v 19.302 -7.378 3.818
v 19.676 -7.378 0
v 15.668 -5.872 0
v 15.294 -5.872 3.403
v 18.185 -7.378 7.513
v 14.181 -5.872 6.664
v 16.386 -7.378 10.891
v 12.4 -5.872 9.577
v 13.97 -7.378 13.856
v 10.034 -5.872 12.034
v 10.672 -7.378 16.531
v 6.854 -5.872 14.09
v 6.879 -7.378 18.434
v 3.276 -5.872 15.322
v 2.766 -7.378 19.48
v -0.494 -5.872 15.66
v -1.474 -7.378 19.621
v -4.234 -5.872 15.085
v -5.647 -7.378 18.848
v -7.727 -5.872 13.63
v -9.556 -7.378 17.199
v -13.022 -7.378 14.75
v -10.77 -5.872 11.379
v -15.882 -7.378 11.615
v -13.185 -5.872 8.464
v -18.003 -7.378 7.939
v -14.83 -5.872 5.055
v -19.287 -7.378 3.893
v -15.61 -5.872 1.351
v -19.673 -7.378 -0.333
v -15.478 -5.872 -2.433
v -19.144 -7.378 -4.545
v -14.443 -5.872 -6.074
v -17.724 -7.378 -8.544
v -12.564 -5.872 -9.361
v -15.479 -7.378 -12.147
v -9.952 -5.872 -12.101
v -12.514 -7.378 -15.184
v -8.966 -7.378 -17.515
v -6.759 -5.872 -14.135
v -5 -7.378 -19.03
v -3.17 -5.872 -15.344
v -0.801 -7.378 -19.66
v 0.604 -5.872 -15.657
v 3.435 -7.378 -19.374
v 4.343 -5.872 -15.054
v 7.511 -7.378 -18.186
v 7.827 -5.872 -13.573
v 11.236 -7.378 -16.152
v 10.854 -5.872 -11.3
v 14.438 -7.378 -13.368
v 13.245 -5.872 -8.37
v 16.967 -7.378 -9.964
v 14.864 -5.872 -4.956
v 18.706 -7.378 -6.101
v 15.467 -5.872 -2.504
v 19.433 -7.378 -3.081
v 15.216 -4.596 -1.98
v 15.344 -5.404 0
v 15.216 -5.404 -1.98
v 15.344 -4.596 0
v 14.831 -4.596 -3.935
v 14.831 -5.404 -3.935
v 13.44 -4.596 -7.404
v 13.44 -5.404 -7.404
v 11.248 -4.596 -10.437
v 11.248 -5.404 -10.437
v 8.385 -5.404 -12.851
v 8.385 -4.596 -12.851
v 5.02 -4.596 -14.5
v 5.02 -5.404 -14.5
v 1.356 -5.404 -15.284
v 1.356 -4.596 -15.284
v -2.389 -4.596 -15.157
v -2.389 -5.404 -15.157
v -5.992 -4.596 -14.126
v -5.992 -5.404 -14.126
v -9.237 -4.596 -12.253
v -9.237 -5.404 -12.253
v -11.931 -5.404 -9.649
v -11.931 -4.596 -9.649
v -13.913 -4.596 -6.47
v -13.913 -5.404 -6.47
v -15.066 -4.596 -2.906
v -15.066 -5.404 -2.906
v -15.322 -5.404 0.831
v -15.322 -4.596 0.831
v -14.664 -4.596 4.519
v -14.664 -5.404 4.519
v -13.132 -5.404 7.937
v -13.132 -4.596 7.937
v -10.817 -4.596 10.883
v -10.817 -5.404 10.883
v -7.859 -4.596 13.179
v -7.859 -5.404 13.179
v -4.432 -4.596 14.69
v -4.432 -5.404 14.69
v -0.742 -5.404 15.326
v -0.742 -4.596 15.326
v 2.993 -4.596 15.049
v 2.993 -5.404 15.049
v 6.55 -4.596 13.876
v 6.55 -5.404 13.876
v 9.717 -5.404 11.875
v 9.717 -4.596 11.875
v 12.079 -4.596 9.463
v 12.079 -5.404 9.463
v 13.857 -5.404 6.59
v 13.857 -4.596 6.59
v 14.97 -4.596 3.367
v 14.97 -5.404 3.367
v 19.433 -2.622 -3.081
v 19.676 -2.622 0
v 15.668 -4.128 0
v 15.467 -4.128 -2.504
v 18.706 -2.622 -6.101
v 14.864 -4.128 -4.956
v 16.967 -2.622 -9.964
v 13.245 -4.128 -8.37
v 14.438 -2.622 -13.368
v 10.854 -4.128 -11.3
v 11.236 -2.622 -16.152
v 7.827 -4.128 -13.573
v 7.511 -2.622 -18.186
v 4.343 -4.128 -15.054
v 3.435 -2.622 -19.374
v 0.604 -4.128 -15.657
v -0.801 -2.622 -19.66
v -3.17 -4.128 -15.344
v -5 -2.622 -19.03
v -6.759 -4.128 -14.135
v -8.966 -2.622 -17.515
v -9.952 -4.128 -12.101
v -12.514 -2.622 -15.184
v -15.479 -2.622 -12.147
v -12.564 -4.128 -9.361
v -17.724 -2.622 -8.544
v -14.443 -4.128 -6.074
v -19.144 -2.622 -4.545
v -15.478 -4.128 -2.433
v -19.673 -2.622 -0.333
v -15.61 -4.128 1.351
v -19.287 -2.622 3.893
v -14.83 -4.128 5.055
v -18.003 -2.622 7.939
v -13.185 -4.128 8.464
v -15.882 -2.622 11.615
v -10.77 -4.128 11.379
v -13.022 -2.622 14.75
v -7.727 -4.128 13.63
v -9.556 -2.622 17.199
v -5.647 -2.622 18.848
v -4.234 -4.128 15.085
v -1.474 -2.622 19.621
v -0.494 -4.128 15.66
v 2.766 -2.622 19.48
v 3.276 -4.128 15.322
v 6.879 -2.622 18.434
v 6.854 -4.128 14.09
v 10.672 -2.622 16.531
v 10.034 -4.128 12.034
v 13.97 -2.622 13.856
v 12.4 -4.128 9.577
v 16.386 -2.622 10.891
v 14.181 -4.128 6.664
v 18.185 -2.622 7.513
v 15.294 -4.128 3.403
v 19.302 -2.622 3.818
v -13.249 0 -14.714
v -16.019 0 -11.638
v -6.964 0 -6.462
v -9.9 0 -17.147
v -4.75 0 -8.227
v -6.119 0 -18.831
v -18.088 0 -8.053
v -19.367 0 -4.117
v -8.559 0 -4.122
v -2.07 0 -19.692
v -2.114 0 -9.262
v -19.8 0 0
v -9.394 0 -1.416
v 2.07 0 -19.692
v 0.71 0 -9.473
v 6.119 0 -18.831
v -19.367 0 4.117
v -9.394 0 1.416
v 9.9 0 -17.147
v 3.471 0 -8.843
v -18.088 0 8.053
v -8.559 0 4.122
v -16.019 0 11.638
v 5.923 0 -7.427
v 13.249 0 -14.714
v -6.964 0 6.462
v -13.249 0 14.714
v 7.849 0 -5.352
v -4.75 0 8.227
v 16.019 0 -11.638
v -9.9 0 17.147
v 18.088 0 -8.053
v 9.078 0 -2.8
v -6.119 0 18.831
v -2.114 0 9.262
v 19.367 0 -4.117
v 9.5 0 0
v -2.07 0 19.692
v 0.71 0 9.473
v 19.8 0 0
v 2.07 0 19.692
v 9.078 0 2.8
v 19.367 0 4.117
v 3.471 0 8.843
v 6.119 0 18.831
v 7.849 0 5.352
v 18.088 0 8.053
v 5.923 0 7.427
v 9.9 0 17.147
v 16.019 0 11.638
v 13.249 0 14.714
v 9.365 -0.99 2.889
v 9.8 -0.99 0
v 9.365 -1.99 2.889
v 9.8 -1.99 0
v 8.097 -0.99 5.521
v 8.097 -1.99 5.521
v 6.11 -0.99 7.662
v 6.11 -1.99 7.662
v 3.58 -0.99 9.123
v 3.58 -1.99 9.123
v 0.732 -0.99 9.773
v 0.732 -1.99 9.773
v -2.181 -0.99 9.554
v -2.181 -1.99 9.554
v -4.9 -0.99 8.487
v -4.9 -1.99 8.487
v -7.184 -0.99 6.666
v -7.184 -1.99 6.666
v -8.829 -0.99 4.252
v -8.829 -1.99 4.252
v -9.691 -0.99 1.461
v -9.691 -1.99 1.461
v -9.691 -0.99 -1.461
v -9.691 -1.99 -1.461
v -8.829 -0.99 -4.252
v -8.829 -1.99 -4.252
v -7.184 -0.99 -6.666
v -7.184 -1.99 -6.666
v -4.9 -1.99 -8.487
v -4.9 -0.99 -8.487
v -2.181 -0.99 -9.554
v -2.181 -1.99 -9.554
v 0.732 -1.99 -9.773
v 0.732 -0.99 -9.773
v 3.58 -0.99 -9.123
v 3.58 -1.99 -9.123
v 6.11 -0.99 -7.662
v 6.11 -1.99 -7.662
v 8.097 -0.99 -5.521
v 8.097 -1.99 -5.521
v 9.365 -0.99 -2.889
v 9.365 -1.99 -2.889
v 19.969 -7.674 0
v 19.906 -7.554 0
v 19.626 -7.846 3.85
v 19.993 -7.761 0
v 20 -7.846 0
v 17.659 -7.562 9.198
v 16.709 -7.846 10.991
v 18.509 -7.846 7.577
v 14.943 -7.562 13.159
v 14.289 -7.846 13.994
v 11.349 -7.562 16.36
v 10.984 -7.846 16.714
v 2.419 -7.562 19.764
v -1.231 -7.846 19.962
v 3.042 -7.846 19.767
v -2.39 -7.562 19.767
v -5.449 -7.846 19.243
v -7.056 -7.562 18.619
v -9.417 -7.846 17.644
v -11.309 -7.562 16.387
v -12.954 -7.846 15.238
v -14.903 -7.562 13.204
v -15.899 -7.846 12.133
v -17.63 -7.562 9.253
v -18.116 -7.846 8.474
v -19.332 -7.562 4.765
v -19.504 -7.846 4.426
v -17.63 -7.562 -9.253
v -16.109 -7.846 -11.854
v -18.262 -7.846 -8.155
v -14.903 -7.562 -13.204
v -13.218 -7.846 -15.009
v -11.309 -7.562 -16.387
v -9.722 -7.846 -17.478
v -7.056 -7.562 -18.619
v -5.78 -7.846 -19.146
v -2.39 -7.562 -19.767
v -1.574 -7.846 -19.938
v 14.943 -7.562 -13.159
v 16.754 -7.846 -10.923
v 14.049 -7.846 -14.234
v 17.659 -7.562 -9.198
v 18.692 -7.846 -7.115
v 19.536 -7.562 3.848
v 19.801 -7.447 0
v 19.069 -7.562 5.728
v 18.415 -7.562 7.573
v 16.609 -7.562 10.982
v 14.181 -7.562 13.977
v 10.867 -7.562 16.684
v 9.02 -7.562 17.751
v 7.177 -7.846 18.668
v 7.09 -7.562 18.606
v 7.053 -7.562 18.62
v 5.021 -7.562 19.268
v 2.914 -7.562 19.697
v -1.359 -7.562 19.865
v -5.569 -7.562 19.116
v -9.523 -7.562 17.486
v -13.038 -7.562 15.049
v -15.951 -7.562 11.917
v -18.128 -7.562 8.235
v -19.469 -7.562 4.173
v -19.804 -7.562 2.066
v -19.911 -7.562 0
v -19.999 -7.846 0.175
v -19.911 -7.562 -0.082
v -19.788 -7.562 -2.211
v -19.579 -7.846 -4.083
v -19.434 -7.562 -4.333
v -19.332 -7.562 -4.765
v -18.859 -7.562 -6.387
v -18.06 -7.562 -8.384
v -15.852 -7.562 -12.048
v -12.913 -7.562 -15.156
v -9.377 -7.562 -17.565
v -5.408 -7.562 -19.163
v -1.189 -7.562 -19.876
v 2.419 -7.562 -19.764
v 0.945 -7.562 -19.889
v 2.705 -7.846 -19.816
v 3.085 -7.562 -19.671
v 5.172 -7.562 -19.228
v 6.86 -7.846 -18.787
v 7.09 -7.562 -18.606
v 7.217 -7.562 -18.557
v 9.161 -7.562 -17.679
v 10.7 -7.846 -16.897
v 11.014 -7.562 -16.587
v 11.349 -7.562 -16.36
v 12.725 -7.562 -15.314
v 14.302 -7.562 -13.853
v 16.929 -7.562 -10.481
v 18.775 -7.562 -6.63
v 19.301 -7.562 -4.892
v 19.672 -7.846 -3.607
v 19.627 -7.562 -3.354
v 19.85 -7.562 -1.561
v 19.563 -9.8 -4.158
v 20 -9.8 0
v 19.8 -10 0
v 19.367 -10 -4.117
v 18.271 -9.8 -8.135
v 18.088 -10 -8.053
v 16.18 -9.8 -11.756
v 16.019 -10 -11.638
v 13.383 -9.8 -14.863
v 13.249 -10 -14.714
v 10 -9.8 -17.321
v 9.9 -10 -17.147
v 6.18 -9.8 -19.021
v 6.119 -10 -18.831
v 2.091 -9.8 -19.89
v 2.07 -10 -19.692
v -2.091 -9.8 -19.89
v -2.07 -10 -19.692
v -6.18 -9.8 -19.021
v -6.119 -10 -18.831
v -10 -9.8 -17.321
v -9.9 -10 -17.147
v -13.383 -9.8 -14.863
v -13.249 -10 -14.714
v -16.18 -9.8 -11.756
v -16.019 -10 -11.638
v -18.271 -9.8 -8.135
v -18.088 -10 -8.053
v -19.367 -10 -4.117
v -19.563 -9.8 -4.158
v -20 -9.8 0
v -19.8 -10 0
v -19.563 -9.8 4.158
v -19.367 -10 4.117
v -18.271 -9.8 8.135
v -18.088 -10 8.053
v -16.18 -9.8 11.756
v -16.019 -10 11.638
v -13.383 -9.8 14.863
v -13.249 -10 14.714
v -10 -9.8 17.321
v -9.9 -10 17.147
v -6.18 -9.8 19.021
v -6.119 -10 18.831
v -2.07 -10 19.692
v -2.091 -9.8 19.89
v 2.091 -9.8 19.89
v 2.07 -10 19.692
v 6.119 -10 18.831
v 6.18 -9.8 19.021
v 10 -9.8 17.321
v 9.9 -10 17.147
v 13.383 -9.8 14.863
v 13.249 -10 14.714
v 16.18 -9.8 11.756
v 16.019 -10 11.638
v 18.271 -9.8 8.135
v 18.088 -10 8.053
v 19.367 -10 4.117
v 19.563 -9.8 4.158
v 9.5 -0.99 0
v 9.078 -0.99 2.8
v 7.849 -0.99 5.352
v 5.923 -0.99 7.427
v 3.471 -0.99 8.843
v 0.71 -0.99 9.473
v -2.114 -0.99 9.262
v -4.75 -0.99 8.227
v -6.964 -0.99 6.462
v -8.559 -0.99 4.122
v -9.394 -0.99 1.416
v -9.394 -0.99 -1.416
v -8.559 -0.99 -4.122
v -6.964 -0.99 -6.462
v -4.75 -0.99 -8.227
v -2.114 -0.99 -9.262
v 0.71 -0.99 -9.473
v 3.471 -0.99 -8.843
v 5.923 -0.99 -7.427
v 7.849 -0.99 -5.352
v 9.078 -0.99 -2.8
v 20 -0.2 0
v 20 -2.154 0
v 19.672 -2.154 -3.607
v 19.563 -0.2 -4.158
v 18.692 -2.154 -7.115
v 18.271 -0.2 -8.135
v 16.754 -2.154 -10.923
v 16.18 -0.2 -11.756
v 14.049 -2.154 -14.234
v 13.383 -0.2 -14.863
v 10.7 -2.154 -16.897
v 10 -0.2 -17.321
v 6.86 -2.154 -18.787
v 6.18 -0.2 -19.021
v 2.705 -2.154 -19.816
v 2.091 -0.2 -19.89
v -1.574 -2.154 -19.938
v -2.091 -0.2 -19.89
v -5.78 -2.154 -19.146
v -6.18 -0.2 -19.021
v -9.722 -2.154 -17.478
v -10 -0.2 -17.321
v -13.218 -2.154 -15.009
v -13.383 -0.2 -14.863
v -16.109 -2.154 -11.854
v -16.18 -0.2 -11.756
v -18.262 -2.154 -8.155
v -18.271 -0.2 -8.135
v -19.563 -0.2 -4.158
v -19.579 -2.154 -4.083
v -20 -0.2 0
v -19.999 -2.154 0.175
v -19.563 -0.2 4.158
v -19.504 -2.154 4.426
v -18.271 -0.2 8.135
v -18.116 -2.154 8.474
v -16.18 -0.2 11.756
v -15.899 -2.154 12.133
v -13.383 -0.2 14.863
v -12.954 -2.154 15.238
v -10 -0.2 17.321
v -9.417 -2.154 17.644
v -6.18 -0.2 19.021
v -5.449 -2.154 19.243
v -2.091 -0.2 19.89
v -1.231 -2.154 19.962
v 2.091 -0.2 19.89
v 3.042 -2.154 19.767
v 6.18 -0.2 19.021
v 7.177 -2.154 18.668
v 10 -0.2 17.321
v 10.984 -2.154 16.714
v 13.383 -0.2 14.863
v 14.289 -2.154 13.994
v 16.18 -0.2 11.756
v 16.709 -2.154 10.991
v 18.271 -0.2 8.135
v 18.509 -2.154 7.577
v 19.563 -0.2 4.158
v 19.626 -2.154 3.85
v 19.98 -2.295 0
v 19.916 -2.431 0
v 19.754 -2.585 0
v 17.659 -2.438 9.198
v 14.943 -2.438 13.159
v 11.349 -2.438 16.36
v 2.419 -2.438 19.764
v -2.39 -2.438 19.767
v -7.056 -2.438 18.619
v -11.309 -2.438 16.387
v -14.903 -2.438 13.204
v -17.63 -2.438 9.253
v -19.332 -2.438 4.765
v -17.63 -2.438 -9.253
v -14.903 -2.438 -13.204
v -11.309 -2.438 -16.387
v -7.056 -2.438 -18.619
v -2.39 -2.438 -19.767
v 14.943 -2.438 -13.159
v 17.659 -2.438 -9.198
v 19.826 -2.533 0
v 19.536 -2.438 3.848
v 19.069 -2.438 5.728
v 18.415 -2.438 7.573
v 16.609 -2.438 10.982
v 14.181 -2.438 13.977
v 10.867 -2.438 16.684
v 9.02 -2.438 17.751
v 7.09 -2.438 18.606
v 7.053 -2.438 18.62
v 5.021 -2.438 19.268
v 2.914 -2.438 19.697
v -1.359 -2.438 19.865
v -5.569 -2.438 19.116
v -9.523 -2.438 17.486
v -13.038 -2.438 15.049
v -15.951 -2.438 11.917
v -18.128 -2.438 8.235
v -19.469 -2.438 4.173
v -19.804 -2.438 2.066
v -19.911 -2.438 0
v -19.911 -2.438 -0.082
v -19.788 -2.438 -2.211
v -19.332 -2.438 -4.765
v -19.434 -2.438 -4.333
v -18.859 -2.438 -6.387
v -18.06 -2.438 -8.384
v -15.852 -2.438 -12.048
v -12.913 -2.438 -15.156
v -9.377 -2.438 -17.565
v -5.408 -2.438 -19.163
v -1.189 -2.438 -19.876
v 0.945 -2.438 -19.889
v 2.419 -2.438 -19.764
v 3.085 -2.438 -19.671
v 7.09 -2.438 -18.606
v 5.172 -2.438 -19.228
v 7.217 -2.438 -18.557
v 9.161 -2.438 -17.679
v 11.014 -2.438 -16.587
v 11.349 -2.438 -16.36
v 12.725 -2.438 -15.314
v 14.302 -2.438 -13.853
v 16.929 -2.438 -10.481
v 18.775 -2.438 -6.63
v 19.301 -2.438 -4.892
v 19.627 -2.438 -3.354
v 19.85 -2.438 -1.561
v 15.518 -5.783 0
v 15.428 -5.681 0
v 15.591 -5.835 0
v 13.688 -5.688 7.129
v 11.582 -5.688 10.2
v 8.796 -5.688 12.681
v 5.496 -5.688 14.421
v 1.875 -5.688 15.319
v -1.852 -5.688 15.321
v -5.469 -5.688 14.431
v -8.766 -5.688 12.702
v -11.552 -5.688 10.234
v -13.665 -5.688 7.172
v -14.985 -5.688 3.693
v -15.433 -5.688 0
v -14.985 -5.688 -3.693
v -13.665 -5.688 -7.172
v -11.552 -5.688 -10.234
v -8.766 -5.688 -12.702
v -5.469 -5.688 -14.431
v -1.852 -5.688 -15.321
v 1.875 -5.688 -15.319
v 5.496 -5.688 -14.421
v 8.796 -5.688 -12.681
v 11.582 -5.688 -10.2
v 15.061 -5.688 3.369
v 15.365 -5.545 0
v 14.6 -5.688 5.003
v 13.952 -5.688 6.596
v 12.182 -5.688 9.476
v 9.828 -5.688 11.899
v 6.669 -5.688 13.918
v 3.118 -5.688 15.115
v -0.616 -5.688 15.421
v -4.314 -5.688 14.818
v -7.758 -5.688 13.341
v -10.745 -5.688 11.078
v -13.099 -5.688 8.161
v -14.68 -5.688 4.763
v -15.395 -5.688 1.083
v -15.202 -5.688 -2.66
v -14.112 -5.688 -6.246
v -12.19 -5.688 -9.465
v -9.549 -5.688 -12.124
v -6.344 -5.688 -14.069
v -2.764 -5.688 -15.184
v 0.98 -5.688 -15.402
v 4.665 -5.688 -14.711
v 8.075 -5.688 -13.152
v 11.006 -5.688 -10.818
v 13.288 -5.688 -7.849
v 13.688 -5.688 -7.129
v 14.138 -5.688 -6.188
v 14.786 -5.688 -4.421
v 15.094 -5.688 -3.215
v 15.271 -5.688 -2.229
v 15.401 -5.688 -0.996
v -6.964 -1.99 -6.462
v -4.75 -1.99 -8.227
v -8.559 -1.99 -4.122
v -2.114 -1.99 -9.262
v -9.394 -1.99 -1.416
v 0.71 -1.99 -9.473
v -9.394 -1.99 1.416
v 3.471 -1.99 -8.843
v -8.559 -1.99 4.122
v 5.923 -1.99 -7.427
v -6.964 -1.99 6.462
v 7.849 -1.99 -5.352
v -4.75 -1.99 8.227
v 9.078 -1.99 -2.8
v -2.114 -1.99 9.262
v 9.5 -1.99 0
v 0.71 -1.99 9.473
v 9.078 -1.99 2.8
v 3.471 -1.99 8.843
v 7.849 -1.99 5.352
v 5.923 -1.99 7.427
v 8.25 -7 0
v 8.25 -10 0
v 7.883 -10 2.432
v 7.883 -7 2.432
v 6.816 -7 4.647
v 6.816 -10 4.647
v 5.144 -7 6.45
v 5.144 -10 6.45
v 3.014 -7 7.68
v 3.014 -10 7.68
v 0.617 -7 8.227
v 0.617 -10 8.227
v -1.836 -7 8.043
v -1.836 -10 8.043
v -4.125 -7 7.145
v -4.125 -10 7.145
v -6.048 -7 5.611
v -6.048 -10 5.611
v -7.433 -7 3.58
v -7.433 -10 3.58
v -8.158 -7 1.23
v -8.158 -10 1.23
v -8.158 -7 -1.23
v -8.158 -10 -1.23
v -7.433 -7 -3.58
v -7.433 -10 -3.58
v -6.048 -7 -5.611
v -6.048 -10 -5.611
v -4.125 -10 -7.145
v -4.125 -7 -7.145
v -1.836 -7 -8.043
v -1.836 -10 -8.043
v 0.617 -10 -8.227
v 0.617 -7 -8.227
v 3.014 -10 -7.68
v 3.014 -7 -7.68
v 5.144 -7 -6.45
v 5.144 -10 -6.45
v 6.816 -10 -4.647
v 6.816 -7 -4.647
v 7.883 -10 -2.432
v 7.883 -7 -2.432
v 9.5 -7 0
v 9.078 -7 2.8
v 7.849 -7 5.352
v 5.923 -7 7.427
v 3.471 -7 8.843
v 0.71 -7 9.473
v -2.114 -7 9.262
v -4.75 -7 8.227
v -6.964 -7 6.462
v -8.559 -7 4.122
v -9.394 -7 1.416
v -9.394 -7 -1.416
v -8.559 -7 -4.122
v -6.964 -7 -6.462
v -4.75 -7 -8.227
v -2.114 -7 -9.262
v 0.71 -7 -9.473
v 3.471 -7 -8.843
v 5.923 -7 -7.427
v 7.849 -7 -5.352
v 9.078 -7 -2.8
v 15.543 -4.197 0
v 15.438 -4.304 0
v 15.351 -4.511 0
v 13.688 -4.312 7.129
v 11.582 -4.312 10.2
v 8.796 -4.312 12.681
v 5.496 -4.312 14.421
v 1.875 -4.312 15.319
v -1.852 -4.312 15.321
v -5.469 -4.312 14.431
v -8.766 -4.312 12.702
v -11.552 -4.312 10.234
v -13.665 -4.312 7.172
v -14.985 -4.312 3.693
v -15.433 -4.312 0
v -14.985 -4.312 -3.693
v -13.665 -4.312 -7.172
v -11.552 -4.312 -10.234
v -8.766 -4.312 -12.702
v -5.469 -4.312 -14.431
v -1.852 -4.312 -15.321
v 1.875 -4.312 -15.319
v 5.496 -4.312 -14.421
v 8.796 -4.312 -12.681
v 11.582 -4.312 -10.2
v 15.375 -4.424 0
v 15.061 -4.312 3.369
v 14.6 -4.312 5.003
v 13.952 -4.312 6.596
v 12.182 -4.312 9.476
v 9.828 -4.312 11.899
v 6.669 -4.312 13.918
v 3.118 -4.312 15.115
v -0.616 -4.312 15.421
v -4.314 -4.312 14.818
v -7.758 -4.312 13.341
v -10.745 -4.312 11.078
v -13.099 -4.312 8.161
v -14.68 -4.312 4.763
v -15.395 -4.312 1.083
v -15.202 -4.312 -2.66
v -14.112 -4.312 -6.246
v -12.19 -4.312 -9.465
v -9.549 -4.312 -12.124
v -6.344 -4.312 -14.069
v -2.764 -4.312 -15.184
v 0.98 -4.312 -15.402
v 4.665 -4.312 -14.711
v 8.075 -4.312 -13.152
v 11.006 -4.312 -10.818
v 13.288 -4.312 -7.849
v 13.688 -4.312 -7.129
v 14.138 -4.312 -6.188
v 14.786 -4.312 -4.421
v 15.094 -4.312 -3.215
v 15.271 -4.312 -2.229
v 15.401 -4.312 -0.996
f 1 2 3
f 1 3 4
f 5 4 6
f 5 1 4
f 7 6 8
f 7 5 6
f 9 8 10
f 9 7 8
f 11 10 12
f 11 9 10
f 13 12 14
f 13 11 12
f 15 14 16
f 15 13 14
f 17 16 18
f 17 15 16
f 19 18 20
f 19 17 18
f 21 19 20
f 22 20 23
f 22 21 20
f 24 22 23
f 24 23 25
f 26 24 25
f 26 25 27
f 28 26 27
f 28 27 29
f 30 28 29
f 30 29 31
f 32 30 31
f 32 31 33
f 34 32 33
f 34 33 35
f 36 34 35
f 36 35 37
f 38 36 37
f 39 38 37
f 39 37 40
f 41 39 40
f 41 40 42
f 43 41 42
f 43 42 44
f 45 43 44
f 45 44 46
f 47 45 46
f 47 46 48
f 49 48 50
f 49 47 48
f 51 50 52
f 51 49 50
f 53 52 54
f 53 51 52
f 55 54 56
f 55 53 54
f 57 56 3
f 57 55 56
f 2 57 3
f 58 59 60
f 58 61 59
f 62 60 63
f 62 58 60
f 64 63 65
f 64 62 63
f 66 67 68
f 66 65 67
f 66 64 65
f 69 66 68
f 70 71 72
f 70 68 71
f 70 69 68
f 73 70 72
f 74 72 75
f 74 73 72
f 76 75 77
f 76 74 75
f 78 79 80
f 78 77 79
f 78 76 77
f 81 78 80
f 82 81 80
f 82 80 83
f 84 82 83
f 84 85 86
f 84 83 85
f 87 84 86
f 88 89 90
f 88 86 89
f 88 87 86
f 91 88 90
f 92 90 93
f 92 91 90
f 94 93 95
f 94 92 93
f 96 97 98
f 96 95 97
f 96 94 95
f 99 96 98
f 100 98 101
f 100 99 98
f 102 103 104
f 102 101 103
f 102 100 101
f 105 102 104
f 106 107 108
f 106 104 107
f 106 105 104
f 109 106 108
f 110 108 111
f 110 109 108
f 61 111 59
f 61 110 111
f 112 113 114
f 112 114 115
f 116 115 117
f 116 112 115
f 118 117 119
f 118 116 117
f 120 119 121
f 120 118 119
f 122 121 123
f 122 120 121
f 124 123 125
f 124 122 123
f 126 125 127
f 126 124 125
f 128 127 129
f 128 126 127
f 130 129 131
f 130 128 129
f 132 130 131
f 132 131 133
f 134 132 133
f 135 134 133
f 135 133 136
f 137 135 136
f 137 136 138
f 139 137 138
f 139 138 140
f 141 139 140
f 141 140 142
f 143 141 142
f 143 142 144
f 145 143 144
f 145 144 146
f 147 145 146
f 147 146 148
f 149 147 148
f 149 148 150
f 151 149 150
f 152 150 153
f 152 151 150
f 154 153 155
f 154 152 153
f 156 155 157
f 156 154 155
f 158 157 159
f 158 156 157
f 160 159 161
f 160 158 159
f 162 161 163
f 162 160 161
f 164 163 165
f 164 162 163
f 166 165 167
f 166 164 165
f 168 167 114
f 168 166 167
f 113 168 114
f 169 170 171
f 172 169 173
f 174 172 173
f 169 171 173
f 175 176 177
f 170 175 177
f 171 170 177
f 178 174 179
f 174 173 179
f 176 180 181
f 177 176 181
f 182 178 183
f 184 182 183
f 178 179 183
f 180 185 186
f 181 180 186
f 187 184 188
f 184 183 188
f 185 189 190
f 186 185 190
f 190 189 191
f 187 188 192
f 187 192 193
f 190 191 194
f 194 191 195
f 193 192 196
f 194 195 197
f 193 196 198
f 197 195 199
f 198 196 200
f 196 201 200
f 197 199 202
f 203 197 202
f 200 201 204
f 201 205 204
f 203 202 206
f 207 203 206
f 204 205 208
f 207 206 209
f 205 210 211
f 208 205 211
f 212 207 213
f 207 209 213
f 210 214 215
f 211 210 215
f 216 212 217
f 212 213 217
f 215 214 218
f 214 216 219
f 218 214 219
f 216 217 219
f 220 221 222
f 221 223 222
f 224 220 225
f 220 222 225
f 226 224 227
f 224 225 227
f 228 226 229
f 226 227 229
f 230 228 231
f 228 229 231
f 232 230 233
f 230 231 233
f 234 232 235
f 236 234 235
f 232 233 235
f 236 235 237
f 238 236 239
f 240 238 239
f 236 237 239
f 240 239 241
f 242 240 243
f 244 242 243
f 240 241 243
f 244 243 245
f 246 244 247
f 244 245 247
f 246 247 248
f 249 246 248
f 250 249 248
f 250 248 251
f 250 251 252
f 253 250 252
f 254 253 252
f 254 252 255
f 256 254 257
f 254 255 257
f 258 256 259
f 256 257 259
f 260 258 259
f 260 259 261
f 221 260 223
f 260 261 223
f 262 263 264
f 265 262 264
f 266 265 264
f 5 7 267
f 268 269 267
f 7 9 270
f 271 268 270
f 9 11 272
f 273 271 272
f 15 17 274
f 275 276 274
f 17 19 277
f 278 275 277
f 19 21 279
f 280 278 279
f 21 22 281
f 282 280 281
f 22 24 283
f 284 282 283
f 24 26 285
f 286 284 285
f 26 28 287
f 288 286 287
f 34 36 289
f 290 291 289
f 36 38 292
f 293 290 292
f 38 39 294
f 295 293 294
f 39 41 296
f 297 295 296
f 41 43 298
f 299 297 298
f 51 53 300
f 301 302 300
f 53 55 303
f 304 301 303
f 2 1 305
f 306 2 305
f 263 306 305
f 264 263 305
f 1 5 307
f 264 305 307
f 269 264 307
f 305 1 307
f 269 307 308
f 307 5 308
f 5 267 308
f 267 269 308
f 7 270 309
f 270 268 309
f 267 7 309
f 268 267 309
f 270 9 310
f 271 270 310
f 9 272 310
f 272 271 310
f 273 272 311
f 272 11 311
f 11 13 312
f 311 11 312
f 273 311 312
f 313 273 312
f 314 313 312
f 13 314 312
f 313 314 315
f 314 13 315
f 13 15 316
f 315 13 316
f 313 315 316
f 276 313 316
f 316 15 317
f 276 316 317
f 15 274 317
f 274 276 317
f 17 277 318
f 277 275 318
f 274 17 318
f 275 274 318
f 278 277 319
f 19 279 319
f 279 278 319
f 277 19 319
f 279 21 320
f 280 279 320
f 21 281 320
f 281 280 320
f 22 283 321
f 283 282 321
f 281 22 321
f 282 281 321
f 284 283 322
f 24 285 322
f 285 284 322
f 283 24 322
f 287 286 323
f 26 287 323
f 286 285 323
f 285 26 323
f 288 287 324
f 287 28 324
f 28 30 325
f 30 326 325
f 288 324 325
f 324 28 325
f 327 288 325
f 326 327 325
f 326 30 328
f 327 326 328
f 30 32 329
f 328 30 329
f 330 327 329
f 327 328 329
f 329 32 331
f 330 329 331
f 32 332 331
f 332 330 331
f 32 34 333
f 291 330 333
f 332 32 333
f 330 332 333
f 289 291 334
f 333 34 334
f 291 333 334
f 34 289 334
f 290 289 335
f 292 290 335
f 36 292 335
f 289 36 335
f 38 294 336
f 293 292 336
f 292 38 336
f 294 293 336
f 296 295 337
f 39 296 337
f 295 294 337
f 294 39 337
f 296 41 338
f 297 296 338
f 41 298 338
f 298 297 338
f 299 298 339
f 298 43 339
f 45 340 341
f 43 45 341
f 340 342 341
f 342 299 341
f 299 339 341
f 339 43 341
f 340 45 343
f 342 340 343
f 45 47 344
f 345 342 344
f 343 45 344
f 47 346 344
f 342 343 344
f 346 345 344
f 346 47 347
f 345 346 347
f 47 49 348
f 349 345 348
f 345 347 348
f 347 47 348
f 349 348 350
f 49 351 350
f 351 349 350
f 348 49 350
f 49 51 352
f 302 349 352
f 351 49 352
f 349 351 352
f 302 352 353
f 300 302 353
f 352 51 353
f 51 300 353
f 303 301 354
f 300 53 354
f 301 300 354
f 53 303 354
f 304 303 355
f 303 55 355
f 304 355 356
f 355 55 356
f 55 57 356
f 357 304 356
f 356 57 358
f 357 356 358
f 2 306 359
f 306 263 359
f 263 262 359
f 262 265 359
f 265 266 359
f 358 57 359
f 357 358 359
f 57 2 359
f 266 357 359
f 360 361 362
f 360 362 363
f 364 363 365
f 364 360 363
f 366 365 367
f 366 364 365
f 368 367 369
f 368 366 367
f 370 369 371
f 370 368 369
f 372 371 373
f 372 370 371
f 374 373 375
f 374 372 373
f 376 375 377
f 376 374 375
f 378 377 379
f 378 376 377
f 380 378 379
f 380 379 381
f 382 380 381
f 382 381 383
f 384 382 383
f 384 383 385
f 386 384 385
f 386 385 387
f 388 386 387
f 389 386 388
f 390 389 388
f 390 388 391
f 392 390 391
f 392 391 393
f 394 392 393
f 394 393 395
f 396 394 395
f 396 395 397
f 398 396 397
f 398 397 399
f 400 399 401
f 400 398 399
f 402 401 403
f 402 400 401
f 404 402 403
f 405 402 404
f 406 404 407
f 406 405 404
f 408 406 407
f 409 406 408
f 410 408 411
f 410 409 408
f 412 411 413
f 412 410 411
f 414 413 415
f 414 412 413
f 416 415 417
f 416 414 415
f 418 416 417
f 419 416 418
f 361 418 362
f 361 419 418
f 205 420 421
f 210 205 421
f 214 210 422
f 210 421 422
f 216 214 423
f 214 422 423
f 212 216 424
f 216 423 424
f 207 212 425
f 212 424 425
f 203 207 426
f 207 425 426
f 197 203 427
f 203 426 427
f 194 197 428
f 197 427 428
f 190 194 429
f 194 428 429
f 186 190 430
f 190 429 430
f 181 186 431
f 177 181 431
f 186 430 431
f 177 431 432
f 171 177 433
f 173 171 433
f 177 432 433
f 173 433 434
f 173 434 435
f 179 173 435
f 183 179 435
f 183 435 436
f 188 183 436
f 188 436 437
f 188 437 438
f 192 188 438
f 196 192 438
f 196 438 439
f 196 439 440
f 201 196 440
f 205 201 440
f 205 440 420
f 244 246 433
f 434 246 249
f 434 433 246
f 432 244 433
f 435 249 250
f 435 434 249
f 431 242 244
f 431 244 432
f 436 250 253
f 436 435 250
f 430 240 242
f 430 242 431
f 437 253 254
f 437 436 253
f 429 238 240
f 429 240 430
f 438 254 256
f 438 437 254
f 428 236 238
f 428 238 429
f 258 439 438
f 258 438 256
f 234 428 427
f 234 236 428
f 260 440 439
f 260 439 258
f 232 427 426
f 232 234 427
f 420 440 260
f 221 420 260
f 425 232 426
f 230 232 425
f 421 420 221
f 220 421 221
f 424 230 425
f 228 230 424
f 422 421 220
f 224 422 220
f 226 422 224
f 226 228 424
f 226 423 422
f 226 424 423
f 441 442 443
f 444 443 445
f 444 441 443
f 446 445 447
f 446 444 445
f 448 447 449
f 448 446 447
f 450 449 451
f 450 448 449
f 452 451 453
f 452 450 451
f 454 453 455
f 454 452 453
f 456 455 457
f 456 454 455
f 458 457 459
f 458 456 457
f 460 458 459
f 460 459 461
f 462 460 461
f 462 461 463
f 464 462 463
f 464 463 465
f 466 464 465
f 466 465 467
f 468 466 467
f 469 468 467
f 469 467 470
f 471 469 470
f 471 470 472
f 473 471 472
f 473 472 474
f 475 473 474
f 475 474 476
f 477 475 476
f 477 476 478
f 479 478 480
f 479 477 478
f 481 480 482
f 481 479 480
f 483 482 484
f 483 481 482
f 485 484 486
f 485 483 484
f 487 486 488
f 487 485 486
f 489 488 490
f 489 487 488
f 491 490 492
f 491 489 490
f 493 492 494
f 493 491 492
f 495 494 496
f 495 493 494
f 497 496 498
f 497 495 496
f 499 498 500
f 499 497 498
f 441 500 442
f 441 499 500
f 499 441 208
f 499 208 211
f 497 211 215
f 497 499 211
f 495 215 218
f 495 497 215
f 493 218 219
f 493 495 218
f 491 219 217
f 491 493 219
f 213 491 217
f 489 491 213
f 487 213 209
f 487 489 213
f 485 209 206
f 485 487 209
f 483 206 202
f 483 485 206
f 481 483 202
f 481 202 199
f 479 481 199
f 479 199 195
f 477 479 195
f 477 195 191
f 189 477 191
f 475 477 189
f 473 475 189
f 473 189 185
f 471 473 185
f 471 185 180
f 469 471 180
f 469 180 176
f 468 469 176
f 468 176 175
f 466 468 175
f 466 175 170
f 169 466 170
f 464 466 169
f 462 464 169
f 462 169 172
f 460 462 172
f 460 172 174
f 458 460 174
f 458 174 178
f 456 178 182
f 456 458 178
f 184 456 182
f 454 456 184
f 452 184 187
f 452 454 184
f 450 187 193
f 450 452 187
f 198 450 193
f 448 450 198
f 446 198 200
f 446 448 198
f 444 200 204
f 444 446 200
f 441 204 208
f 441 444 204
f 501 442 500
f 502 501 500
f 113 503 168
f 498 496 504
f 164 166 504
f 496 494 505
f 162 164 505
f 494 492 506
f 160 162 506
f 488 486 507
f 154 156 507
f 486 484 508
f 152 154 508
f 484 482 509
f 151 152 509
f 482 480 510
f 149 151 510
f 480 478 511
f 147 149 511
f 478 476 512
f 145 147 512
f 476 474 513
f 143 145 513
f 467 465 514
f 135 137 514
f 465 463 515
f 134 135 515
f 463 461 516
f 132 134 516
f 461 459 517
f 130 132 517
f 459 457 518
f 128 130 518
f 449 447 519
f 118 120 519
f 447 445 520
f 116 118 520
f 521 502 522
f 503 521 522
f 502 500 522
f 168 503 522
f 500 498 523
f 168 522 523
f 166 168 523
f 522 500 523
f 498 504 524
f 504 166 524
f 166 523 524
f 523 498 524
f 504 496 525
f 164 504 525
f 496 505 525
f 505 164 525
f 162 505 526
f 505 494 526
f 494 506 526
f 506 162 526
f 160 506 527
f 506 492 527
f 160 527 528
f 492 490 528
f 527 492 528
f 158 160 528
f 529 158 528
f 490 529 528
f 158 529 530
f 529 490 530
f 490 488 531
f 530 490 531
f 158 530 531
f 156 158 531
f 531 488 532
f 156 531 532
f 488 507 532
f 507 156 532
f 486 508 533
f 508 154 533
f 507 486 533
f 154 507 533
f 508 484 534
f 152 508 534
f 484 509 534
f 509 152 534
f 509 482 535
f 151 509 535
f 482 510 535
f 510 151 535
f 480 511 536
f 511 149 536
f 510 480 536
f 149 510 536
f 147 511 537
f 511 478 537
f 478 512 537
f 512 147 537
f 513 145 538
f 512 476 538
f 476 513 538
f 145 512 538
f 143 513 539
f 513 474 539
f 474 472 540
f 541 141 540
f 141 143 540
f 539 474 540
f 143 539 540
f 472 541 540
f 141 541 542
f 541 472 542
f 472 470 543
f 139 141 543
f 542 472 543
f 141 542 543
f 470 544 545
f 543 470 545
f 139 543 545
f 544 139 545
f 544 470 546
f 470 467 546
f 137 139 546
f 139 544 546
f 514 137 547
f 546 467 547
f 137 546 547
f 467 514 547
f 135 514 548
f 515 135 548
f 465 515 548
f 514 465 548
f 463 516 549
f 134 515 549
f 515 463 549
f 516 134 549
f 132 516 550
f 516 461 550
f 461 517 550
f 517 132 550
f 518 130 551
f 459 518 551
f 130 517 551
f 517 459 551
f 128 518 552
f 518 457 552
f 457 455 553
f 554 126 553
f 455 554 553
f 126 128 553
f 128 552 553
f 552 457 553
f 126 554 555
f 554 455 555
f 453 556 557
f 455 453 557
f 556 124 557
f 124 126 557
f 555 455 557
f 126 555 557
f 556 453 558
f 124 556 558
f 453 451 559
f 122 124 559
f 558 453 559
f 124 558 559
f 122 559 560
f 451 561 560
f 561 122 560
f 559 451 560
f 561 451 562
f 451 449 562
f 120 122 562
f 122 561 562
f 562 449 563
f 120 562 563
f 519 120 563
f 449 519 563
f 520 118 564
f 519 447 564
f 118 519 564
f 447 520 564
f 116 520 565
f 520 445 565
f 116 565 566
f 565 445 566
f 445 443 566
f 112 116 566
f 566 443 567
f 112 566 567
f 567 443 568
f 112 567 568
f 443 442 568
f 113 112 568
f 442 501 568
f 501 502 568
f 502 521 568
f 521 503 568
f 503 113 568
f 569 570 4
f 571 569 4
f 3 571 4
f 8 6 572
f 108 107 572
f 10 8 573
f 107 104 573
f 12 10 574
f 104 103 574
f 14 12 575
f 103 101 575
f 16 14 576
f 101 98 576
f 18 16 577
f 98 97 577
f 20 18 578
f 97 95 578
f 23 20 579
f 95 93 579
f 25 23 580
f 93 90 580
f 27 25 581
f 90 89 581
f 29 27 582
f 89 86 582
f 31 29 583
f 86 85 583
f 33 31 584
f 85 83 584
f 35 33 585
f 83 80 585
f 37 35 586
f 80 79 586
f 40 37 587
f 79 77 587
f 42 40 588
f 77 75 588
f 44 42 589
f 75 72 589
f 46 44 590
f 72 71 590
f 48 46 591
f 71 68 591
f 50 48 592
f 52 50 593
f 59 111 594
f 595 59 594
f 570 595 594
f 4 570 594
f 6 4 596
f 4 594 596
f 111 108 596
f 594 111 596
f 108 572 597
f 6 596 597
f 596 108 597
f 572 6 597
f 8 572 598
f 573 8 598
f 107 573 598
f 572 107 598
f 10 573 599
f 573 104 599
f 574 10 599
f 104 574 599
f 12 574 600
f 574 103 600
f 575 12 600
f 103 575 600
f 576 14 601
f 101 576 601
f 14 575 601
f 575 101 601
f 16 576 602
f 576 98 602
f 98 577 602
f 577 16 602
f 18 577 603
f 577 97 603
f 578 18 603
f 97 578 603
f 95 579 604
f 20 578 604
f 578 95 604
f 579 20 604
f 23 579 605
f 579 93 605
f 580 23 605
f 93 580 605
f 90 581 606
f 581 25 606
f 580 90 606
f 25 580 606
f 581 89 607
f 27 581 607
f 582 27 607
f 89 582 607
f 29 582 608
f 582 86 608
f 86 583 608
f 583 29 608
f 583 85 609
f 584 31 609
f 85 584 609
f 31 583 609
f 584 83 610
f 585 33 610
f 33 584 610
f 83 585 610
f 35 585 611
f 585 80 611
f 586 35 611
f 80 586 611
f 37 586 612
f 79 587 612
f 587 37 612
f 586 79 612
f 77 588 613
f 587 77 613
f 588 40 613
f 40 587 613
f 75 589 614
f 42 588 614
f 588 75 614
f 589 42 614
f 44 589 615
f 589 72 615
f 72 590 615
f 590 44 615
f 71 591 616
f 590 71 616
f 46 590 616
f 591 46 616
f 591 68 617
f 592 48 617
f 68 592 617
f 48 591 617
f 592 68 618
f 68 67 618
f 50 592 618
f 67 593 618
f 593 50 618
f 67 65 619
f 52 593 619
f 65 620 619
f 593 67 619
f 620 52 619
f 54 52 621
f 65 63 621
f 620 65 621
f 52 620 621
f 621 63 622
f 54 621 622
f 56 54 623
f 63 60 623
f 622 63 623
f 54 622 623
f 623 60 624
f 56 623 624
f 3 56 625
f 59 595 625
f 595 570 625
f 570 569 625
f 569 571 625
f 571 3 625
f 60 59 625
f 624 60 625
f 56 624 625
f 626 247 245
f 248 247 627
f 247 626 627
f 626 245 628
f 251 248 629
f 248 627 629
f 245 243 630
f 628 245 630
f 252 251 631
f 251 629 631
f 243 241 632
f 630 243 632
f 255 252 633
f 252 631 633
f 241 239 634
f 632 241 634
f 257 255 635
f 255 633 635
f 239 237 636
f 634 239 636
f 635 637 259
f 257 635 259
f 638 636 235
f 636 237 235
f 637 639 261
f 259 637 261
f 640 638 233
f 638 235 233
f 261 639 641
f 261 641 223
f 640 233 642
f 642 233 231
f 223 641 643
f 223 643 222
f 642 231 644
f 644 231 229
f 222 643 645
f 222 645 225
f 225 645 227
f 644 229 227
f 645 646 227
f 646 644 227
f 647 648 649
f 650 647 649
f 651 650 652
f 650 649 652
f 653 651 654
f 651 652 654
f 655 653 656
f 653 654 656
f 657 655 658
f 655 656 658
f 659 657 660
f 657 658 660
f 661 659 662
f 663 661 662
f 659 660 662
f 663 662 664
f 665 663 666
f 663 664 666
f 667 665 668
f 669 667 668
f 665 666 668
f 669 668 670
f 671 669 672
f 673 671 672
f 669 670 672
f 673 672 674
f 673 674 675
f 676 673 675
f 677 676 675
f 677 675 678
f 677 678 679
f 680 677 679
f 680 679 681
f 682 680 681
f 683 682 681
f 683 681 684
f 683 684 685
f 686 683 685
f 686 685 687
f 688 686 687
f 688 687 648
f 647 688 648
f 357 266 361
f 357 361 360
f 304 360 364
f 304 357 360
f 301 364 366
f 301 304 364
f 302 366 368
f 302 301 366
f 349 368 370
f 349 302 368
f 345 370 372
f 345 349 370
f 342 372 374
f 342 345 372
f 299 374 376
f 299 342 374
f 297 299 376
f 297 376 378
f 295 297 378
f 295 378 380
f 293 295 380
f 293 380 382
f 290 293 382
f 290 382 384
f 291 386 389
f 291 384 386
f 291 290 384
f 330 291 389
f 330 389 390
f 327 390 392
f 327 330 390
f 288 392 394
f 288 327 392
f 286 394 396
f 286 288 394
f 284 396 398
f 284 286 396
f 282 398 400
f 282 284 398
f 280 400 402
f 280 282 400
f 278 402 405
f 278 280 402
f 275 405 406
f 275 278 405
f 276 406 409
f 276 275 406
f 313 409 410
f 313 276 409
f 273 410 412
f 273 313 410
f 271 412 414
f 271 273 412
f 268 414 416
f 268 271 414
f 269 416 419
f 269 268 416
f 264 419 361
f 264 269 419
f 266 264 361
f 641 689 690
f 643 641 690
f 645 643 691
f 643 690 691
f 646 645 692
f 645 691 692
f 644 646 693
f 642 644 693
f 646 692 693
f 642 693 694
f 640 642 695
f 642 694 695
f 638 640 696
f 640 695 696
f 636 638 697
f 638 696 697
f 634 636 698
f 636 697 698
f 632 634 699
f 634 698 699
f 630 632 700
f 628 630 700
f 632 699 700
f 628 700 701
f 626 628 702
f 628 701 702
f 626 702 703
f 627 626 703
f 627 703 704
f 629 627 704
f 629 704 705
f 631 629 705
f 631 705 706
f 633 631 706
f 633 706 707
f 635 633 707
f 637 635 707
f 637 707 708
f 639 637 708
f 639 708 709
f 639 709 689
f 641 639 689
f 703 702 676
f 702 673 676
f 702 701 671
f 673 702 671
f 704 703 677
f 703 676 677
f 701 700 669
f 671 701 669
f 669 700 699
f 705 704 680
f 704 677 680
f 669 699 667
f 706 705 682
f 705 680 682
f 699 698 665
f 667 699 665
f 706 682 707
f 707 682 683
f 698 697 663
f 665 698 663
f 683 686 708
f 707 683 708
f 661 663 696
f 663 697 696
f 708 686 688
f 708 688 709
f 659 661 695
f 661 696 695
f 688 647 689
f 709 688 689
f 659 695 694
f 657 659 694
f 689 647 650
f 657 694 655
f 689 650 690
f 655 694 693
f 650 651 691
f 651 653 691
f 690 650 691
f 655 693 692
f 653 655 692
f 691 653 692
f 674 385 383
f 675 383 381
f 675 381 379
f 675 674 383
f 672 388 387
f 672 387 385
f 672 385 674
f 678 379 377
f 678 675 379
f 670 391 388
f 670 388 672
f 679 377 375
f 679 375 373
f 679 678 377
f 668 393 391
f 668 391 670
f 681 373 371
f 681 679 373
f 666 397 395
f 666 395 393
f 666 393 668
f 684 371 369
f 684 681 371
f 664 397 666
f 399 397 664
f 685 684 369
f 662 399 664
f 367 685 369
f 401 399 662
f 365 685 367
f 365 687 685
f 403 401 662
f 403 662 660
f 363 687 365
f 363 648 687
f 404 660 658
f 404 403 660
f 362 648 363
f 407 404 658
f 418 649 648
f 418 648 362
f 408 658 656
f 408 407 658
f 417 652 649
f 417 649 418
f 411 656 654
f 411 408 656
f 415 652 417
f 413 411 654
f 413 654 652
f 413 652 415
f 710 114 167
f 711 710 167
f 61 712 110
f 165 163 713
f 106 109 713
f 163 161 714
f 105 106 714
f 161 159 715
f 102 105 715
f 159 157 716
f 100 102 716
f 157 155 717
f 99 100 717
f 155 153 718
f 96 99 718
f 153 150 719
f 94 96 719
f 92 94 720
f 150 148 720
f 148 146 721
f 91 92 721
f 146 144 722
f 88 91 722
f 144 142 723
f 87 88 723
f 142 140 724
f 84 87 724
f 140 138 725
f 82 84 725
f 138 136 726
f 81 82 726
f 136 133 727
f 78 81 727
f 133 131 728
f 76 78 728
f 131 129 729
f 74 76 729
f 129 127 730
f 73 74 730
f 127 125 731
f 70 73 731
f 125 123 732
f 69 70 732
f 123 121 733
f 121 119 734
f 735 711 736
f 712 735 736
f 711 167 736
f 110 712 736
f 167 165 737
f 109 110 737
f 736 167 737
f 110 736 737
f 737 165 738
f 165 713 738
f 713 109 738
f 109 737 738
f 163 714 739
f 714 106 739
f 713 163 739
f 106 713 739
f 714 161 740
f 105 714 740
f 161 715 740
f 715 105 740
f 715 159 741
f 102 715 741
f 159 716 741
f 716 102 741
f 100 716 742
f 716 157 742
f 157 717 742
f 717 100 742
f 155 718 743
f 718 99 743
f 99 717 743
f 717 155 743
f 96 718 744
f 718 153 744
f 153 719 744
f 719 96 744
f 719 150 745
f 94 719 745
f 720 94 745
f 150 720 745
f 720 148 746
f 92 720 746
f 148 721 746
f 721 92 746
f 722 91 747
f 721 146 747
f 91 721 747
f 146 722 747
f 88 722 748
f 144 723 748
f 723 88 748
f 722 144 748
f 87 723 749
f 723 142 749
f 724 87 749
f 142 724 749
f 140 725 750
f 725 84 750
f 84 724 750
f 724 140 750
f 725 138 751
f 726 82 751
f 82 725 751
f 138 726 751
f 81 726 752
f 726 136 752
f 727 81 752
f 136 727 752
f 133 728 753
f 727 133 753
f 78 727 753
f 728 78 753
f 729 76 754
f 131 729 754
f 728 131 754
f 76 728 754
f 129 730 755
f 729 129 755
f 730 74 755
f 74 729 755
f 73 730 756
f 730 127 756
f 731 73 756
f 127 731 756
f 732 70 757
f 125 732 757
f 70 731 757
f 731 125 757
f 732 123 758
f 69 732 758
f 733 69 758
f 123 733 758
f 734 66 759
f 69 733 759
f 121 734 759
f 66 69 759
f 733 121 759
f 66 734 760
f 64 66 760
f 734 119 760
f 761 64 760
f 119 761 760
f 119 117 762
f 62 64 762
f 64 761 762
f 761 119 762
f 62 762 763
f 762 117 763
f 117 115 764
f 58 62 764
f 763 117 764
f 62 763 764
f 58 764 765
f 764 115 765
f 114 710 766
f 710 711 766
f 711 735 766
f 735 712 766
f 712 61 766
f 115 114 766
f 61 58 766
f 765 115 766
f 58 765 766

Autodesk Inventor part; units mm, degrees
ref_plane "YZ Plane" through (0, 0, 0) normal (1, 0, 0) x (0, 1, 0)
ref_plane "XZ Plane" through (0, 0, 0) normal (0, 1, 0) x (-1, 0, 0)
ref_plane "XY Plane" through (0, 0, 0) normal (0, 0, 1) x (1, 0, 0)
sketch "Sketch1" plane through (0, 0, 0) normal (0, 0, 1) x (1, 0, 0)
  line L0 (0, 0) -> (0, -10) construction
  line L1 (8.25, -10) -> (20, -10)
  line L2 (20, -10) -> (20, -7.5)
  line L3 (20, -7.5) -> (15.3441, -5.75)
  line L4 (15.3441, -5.75) -> (15.3441, -4.25)
  line L5 (15.3441, -4.25) -> (20, -2.5)
  line L6 (20, -2.5) -> (20, 0)
  line L7 (20, 0) -> (9.5, 0)
  line L8 (9.5, 0) -> (9.5, -0.99)
  line L9 (9.5, -0.99) -> (9.8, -0.99)
  line L10 (9.8, -0.99) -> (9.8, -1.99)
  line L11 (9.8, -1.99) -> (9.5, -1.99)
  line L12 (9.5, -1.99) -> (9.5, -7)
  line L13 (9.5, -7) -> (8.25, -7)
  line L14 (8.25, -7) -> (8.25, -10)
  line L15 (15.3441, -5) -> (20.953, -5) construction
  dimension "d0" = 11.75
  dimension "d1" = 3
  dimension "Length" = 10
  dimension "d3" = 0.99
  dimension "d4" = 1
  dimension "d5" = 0.3
  dimension "d6" = 1.25
  dimension "d7" = 8.25
  dimension "d8" = 1.5
  dimension "d9" = 2.5
  dimension "d10" = 4.6559
revolve "Revolution1" add sketch "Sketch1" angle 360 about axis through (0, 0, 0) along (0, -1, 0)
fillet "Fillet1" radius 0.5 4 edges at (-15.3441, -5.75, 0) (-15.3441, -4.25, 0) (-20, -7.5, 0) (-20, -2.5, 0)
chamfer "Chamfer1" distance 0.2 angle 45 2 edges at (-20, 0, 0) (-20, -10, 0)
equation "\"Diameter\" = 40"
properties part number "Pully" material "Steel, Cast"
